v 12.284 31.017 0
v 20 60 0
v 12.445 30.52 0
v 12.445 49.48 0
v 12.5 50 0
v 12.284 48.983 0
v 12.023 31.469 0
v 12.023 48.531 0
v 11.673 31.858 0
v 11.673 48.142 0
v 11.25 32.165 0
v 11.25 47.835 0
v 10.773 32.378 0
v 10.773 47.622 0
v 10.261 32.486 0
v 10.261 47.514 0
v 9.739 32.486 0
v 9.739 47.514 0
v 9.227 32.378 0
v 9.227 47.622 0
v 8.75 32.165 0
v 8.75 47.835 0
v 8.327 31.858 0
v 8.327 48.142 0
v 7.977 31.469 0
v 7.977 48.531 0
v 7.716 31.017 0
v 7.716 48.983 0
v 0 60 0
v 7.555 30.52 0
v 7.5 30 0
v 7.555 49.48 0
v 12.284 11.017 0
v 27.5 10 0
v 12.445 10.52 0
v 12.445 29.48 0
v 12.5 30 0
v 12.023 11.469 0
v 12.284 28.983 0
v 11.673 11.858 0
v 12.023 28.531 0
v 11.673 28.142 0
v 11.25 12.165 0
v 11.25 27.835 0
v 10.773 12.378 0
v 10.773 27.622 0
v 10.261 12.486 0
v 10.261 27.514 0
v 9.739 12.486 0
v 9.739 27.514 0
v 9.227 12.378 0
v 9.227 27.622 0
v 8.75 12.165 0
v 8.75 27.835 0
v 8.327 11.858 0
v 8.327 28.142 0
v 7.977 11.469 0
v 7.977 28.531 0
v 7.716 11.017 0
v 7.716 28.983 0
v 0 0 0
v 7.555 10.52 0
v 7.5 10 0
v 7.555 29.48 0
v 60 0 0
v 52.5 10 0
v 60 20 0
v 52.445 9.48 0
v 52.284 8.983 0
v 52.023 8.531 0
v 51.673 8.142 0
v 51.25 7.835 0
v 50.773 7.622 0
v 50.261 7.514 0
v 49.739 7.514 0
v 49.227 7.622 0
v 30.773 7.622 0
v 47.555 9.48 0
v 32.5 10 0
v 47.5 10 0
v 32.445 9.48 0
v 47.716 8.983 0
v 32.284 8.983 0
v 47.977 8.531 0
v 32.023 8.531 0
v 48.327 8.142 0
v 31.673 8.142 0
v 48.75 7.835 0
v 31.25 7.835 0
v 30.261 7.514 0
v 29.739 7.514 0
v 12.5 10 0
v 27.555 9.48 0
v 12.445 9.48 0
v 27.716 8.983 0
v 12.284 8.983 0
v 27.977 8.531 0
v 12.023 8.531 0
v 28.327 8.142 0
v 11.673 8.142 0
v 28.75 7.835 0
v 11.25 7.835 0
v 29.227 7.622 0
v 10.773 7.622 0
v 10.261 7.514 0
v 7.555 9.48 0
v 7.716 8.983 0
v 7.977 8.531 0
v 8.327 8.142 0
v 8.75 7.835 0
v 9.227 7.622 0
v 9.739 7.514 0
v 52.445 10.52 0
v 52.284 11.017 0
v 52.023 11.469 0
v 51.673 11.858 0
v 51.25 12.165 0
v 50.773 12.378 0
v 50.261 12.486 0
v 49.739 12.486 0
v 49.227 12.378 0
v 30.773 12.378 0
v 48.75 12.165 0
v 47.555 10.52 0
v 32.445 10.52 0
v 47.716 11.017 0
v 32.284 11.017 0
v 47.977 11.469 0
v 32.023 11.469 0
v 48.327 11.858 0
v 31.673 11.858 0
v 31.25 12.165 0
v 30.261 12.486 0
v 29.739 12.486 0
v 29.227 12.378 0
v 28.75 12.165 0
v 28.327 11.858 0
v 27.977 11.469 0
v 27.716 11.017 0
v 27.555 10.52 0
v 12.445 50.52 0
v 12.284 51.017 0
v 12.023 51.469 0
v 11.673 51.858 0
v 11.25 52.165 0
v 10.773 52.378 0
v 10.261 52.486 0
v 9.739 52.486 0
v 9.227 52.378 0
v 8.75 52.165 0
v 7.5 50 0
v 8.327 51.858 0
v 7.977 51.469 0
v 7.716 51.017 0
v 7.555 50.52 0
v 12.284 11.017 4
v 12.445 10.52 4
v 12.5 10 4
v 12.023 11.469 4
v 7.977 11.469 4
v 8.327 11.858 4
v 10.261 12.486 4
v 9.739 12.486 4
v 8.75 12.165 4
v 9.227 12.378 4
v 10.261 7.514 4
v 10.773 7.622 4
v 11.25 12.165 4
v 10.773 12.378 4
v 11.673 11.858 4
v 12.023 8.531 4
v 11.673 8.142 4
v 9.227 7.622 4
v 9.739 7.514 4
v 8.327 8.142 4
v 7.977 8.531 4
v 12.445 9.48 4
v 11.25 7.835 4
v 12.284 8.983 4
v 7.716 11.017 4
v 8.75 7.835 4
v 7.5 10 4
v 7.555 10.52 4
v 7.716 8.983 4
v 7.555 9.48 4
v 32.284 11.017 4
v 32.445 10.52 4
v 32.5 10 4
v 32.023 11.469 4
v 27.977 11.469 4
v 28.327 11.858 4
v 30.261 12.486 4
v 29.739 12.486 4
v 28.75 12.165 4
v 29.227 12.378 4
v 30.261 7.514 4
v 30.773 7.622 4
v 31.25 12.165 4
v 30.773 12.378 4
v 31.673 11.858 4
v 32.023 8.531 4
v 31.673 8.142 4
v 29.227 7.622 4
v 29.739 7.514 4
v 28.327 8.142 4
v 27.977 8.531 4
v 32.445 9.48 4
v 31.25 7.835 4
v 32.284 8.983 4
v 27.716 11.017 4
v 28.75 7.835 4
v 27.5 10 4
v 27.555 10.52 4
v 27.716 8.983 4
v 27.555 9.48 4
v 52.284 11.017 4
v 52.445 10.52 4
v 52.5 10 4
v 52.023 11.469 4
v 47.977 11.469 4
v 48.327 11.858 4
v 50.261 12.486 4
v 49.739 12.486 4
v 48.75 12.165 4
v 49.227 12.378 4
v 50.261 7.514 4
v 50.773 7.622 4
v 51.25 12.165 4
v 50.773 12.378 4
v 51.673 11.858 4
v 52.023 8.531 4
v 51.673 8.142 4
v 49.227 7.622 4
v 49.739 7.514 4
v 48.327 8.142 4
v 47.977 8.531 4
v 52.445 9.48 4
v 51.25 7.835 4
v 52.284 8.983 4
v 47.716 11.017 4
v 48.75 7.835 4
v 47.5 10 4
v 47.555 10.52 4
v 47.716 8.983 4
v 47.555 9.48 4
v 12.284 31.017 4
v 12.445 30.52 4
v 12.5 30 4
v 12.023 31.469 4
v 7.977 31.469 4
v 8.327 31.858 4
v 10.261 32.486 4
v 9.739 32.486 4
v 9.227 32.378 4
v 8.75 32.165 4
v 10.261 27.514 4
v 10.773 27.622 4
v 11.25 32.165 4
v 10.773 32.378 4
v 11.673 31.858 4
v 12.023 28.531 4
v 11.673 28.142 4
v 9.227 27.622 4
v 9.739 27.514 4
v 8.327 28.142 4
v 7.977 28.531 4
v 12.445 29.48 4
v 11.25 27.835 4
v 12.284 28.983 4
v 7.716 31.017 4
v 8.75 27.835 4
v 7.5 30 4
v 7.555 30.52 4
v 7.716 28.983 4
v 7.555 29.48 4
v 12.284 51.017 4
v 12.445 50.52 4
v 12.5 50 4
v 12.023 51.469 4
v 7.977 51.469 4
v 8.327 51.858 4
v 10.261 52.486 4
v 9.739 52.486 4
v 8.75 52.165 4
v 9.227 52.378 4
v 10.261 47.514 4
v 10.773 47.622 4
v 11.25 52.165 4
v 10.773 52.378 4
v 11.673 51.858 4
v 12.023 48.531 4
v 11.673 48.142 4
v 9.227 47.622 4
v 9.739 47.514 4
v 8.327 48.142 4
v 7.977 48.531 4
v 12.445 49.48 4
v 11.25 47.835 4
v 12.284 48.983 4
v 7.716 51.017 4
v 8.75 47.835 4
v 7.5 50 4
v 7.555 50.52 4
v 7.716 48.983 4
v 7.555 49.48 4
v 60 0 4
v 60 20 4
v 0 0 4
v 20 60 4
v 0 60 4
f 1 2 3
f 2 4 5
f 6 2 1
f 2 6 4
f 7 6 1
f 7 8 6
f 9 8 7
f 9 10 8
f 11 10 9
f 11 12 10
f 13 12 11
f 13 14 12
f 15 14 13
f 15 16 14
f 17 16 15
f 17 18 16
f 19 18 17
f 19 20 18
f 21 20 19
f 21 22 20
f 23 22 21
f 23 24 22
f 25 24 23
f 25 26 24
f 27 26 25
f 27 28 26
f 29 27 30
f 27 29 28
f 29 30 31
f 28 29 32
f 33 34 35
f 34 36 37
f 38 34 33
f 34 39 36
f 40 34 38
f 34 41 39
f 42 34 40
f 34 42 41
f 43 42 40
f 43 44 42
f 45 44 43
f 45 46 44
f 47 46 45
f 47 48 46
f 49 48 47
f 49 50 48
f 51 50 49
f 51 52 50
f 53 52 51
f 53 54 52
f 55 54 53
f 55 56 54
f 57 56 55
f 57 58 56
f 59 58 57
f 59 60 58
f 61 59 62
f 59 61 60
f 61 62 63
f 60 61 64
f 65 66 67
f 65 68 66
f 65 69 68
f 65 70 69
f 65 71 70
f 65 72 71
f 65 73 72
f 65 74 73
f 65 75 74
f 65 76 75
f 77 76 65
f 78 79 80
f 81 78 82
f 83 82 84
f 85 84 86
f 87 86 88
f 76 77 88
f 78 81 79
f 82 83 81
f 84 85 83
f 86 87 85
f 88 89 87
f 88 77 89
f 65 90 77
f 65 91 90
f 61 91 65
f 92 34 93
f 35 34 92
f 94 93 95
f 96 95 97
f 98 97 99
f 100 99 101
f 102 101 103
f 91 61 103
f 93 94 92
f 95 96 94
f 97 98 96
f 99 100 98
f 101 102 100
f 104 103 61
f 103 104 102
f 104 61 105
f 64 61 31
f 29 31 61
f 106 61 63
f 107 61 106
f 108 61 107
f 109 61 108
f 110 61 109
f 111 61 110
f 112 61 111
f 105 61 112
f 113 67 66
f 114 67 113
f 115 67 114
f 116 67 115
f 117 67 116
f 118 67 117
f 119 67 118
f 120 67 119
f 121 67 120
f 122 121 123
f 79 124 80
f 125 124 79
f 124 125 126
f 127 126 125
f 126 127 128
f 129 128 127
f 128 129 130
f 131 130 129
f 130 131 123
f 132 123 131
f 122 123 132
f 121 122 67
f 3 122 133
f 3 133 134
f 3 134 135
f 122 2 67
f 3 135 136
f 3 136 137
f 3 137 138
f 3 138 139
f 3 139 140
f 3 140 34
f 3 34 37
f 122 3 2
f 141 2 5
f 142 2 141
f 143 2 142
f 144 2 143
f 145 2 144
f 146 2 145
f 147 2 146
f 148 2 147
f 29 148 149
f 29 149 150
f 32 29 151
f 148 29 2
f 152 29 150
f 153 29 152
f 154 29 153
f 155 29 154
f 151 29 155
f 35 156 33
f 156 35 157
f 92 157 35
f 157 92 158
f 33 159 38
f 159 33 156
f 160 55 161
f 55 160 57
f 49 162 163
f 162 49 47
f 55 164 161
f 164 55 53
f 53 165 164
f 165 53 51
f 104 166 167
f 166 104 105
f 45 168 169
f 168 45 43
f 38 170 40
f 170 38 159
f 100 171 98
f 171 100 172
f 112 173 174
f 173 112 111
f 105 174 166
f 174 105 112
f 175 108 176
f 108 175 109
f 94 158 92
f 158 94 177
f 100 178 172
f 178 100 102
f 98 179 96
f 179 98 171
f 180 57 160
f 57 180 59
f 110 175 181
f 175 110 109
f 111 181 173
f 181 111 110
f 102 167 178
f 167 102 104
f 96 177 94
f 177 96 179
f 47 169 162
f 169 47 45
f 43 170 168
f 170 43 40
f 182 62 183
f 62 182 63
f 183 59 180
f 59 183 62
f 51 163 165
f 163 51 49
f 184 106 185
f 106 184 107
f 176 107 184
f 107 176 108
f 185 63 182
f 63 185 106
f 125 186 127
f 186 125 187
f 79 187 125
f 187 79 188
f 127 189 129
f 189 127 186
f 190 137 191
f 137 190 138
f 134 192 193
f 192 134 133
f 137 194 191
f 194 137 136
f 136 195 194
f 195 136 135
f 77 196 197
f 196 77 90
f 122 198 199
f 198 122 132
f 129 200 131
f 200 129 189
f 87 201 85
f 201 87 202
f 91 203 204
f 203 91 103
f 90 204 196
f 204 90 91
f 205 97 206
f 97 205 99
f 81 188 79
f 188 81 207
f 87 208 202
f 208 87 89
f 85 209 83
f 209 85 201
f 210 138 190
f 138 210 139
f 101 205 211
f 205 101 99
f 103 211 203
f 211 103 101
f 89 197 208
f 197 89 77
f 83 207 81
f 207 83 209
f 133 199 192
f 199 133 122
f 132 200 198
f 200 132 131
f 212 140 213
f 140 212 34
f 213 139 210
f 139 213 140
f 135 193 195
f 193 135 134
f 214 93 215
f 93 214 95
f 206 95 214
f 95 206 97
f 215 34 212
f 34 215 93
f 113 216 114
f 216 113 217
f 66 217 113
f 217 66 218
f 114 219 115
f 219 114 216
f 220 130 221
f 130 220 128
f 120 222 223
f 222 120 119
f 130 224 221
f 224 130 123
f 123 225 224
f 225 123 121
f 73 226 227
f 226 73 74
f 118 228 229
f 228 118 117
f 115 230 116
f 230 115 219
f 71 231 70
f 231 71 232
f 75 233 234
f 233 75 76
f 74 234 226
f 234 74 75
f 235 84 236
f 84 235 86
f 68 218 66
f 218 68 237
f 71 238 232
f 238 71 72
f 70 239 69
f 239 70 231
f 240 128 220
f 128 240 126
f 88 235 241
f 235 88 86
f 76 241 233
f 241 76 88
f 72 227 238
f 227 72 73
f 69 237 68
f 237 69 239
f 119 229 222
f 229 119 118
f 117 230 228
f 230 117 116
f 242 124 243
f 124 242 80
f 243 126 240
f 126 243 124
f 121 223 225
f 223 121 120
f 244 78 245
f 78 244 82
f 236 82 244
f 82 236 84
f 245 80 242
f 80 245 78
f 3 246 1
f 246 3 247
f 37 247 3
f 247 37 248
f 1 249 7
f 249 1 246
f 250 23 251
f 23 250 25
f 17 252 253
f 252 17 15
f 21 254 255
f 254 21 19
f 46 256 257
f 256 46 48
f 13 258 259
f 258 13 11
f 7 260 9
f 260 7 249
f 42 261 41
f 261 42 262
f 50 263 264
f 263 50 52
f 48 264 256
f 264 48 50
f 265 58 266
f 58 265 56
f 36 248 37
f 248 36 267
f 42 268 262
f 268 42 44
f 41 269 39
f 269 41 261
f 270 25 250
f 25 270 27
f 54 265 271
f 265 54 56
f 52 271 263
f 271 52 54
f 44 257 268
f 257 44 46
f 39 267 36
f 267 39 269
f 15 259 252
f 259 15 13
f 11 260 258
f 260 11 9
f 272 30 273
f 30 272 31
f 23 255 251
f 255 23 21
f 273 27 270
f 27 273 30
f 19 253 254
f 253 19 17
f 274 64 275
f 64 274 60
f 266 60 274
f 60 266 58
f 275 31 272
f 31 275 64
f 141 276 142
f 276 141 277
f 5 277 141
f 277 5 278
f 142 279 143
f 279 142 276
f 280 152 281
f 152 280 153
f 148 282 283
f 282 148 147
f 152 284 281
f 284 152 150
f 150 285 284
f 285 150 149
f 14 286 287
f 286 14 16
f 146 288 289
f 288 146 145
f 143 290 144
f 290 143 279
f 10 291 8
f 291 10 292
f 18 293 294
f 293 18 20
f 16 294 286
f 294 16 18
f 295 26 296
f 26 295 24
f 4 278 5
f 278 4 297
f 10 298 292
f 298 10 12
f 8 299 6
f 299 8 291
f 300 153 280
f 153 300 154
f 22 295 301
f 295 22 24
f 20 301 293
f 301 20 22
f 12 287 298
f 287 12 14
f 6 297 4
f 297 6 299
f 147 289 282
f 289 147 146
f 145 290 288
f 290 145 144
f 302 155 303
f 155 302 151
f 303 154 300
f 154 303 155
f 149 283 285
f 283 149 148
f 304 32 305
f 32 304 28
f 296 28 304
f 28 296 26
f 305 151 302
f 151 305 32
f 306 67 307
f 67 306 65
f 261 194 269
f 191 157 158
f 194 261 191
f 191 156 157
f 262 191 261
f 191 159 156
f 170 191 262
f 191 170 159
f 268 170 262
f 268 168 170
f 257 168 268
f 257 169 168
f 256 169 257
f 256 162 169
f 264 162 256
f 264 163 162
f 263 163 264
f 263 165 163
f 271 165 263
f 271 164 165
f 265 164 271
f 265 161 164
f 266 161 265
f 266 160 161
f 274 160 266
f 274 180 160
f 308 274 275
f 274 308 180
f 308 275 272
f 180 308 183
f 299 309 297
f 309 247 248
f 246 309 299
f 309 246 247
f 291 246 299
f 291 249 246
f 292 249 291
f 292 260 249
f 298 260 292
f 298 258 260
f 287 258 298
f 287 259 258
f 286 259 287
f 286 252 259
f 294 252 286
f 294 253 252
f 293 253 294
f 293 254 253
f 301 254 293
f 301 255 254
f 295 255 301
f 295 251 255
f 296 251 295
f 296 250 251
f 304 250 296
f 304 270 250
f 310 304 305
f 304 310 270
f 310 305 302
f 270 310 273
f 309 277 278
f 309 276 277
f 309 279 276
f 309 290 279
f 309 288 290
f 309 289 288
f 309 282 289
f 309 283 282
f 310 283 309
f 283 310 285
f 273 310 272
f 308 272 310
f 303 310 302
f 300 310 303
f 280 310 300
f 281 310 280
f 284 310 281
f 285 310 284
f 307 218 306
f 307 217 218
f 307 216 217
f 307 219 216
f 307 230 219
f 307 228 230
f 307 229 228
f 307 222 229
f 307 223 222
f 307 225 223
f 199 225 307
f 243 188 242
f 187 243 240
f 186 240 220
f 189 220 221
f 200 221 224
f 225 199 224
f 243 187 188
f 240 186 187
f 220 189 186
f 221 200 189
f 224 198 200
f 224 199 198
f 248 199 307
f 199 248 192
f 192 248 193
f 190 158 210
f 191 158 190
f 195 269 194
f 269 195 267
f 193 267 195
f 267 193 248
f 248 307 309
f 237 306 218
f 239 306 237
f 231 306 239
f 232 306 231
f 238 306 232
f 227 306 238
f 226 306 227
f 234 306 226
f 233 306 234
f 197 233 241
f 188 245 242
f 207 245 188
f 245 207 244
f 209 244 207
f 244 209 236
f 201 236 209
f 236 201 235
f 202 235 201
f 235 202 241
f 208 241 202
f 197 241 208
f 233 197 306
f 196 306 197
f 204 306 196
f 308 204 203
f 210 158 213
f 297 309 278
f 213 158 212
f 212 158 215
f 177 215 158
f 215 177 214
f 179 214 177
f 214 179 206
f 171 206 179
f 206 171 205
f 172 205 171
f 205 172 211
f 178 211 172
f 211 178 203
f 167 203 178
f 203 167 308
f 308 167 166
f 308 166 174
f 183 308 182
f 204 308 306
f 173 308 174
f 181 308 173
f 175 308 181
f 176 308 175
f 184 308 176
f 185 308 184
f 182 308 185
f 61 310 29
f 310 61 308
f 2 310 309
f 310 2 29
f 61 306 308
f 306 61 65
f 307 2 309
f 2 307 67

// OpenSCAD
// compatible avec https://fr.aliexpress.com/item/32963365007.html
// v1

A_x = 60;
B_x = 20;

A_y=A_x;
B_y= B_x;

epp = 4 ;

dia = 5 ;  // diameter of holes


module connector(){
    difference() {
    cube([A_x, A_y, epp]);
    {
        // holes on X axis
        for (i = [ 0 : 2 ]) {
          translate([10 +  i*20, 10, 0])
            cylinder(r=dia/2, h=10, $fn = 30);         
          };
        // holes for Y axis
        for (j = [ 0 : 1 ]) {
          translate([10, 30 +  j*20,  0])
            cylinder(r=dia/2, h=10, $fn = 30);         
        }
        // coupure en biais
        
        translate([40,40,0])
        rotate([0,0,45+90])
        translate([0, -15, 0])
        cube([100,30, 20], center= true);
        
    }
    }
}


connector();
